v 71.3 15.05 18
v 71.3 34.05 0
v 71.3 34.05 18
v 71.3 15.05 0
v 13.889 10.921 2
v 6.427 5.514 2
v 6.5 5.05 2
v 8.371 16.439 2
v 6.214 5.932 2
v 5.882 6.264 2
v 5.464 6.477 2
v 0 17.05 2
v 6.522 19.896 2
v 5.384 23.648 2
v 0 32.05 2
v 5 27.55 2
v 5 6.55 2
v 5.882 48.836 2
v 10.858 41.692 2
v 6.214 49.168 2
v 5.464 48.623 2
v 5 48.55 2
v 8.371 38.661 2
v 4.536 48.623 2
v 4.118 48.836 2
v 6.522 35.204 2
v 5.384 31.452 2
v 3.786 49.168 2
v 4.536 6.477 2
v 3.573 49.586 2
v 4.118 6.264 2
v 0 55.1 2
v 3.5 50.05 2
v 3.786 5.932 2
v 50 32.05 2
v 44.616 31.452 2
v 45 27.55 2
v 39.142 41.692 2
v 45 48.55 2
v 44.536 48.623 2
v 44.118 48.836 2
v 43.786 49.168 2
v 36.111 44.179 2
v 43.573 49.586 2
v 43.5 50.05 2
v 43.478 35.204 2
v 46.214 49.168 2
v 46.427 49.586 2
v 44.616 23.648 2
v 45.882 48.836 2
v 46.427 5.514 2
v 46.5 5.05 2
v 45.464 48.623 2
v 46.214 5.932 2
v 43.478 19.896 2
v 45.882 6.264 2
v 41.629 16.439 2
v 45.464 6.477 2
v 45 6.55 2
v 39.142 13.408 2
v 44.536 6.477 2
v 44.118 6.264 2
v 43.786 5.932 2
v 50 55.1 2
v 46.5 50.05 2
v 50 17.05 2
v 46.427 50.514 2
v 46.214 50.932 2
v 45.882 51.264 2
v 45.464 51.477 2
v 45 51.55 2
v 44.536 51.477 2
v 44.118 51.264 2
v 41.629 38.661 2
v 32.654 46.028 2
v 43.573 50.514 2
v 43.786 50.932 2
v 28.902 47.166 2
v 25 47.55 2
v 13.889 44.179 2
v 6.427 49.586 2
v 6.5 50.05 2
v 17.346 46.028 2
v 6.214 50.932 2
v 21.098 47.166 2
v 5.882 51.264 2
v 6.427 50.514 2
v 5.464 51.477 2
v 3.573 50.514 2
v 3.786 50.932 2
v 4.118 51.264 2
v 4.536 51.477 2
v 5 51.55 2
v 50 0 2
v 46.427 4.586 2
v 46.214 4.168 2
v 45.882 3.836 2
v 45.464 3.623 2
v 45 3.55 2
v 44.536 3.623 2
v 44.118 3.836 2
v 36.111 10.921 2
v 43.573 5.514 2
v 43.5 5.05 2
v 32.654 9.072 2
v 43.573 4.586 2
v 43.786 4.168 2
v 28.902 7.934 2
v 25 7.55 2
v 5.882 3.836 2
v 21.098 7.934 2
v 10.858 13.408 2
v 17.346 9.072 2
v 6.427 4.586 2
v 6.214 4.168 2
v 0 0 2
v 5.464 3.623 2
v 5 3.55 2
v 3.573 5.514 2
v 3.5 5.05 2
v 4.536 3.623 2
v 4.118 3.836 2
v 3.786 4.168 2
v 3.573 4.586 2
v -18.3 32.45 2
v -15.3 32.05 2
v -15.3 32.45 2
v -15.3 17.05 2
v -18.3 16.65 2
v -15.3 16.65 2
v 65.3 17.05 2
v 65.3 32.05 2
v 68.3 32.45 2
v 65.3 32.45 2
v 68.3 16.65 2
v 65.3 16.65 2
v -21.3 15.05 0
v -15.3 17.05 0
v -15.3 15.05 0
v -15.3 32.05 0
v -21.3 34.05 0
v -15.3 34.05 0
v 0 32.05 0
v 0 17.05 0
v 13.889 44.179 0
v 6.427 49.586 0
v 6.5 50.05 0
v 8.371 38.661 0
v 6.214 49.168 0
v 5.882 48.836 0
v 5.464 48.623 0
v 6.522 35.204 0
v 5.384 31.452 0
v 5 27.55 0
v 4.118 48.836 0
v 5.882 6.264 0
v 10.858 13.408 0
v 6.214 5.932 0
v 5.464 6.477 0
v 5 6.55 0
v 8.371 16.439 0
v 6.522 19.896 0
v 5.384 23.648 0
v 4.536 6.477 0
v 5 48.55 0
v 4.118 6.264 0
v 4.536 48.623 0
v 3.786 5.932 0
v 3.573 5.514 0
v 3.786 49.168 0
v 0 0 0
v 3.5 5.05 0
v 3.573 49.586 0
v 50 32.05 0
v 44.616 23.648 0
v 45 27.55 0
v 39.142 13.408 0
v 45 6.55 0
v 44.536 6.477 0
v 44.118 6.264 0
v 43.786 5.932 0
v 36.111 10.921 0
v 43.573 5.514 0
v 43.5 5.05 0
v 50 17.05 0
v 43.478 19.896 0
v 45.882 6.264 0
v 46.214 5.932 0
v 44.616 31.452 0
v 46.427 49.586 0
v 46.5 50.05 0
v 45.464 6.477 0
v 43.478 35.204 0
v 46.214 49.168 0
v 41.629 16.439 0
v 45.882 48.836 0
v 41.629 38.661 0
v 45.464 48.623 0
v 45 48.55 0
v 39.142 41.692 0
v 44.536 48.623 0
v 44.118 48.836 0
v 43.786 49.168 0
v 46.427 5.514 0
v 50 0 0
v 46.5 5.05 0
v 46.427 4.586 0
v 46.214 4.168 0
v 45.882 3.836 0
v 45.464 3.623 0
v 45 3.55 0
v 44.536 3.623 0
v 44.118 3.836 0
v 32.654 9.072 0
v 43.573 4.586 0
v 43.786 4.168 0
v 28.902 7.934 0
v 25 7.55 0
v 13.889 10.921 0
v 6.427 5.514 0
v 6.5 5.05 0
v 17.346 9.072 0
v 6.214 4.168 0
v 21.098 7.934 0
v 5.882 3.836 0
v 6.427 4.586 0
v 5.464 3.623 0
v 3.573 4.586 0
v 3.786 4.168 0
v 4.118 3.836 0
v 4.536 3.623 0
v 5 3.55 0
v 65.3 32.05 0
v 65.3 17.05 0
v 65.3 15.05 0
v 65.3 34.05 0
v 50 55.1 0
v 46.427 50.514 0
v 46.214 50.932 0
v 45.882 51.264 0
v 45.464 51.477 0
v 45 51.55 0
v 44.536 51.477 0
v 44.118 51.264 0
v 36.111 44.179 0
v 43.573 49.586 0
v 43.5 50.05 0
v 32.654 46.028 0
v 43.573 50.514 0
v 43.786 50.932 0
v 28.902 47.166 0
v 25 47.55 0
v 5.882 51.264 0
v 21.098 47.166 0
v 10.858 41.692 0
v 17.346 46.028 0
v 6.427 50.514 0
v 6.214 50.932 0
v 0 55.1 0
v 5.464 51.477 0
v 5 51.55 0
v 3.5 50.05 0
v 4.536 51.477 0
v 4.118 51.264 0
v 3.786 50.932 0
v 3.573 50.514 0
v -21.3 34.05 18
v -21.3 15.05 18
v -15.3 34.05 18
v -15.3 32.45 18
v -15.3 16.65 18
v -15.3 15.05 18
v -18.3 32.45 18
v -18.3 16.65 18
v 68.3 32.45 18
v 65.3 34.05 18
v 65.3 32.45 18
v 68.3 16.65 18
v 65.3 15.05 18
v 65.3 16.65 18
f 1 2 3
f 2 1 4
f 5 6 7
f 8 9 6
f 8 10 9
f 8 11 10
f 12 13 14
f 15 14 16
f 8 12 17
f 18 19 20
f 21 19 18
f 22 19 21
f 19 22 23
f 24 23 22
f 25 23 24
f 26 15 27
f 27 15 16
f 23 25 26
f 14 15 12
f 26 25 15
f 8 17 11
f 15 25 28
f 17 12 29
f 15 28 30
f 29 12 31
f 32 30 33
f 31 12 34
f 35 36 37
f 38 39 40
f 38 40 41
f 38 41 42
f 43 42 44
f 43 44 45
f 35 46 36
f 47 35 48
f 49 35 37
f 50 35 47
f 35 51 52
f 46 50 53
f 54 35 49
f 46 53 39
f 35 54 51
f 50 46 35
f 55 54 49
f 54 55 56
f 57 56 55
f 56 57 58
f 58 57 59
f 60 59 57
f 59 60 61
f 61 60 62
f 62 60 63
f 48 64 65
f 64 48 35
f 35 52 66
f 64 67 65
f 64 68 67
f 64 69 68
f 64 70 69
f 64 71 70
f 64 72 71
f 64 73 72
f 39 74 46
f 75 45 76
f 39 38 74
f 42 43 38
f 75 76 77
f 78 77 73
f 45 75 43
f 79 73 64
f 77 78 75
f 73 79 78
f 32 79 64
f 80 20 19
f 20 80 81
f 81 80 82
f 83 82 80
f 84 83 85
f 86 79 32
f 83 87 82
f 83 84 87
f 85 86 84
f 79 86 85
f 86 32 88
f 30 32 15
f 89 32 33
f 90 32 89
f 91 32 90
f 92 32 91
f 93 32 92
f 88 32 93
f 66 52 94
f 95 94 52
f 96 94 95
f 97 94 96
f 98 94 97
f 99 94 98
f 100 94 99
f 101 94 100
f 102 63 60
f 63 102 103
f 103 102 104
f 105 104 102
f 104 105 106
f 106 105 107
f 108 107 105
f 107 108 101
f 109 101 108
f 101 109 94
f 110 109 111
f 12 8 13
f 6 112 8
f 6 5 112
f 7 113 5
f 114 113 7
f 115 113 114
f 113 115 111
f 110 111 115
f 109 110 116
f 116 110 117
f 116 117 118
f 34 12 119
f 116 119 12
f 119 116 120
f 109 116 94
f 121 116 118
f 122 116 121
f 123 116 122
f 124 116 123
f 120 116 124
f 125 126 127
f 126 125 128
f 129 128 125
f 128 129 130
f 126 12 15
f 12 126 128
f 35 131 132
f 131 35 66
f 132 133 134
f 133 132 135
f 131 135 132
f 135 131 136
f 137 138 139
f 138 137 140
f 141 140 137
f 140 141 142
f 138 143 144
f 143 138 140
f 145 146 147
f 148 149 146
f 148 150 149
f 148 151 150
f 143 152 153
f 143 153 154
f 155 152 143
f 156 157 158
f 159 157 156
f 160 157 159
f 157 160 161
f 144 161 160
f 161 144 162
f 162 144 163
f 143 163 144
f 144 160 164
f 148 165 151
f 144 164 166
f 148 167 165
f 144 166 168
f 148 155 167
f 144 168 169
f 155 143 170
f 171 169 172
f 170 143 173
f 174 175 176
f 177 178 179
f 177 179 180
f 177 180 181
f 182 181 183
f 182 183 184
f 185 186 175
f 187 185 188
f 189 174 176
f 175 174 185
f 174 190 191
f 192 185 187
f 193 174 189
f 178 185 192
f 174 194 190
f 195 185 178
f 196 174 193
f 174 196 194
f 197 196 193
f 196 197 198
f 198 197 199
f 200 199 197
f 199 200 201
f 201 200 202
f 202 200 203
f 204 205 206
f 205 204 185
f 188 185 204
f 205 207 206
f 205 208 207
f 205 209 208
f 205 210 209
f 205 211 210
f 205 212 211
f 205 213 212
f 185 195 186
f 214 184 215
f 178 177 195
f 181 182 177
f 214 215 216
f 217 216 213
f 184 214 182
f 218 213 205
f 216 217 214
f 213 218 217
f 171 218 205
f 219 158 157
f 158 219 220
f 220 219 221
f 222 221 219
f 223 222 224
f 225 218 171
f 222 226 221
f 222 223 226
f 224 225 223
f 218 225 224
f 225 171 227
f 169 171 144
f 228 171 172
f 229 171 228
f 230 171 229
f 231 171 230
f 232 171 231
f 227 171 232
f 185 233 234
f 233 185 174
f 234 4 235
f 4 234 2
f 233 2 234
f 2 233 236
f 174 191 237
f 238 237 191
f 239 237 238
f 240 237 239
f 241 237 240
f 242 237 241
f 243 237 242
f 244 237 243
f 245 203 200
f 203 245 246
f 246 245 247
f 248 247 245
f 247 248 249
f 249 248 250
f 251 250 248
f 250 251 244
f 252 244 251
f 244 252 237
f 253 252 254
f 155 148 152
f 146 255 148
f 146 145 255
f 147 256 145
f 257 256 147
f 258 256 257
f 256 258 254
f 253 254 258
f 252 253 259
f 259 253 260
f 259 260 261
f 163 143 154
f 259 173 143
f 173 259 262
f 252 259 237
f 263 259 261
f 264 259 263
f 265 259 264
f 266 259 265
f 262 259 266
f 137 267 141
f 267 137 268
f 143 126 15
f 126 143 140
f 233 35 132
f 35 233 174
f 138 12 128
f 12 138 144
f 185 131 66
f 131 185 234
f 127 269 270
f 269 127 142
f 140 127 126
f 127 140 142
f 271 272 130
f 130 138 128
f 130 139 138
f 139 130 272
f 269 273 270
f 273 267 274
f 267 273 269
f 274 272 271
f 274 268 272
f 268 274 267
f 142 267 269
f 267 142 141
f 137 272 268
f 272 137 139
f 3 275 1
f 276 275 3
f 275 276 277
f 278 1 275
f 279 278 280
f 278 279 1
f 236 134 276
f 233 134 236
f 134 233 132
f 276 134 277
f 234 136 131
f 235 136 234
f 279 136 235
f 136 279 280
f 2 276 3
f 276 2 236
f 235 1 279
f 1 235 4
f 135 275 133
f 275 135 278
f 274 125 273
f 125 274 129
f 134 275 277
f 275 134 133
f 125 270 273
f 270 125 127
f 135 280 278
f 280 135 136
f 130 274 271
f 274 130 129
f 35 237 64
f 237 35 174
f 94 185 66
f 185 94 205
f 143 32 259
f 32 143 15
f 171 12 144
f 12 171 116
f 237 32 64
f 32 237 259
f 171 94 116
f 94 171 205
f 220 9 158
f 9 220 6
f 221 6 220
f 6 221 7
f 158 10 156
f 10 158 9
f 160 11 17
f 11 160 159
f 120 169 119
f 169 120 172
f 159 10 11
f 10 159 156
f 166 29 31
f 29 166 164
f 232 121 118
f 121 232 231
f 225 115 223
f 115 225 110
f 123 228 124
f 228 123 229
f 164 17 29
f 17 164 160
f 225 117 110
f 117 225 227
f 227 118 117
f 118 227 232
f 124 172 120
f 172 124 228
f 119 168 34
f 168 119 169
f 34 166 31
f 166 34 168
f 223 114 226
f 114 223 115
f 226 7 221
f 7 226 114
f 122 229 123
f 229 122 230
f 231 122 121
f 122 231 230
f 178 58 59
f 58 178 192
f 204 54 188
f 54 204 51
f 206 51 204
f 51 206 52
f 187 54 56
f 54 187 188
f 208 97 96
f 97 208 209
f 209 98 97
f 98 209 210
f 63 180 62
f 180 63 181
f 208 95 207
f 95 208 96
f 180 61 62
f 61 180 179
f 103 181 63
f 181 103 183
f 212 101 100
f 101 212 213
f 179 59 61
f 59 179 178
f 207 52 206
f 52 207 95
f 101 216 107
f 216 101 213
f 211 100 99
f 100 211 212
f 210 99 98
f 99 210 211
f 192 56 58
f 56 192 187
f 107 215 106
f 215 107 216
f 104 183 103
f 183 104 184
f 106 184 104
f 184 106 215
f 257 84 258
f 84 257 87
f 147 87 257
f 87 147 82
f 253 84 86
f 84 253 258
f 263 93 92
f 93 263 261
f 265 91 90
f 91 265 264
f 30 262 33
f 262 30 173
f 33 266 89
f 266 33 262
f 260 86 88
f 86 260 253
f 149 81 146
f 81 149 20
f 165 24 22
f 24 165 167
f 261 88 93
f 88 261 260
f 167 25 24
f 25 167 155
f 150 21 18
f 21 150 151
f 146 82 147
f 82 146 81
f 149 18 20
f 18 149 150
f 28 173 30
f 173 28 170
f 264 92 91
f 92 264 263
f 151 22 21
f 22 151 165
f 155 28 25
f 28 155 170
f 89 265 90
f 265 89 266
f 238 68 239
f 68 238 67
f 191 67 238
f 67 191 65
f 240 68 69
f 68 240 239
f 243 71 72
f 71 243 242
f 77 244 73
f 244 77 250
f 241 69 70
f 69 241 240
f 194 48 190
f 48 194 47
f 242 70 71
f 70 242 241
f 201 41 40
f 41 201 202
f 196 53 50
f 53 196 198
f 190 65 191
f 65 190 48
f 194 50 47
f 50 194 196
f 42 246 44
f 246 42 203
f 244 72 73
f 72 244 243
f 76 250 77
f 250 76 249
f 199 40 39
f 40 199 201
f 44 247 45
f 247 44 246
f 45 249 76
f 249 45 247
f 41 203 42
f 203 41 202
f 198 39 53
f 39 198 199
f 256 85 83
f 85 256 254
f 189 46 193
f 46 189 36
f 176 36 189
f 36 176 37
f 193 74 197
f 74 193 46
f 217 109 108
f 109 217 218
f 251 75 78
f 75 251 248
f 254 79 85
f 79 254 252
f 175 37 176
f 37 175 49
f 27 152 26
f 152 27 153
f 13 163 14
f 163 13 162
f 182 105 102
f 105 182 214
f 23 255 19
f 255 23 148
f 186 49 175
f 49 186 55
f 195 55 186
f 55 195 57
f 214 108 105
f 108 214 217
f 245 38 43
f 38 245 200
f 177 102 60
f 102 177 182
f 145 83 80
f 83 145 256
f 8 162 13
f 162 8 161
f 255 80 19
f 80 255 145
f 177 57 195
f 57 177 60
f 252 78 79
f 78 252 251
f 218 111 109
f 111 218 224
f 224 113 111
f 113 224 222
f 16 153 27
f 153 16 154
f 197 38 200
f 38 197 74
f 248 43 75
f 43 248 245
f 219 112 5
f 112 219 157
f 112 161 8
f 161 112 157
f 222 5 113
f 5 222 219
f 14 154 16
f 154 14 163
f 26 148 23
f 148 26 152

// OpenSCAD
// autotron Pi mountovi

// opće konstante
r_hole=3.5/2;

// power bank

// dimenzije
pb_w=79.2;
pb_l=110.14;
pb_h=21.25;
pb_d=3;
pb_sup=5;
pb_holder_l=15;
pb_holder_h_back=5;
pb_save_r=30;
// mount rupe
pb_mount_l=65.75;
pb_mount_w_front=47.02;
pb_mount_w_back=53.85;
pb_mount_l_displace=18;

// kontrola motora

// dimenzije
moto_a=50;
moto_b=55.1;
moto_hole_a=40;
moto_hole_b=45;
pind=3;
pinh=3;
flatw=55;
flath=2;
grab_l=3;
grab_h=16;

// RPi

// dimenzije
rpi_l=56.06;
rpi_w=85.05;
rpi_d=2.5;
rpi_r_l=20;
rpi_f_l1=5;
rpi_f_s2=16.3;
rpi_f_l2=5;
rpi_f_s3=41;
rpi_f_l3=7;
rpi_f_l4=25;
// mount
rpi_hole_l=43.2;
rpi_hole_w=44.5;
rpi_holder_h=8;

//cam

//dimenzije
cam_l=1.75;
cam_w=25;
cam_h=23.85;
cam_r=7.5/2;
cam_s_r=2.5/2;
//mount
cam_holder_h=10;
cam_holder_grab=2;
cam_holder_d=2;
cam_hole_w=14;

//[x,y,z]

//color([255,0,0,100])powerbank();
//translate([-pb_d,-pb_d,-pb_d])pb();
powershield();
//RPi();
//translate([-10,0,0])cam_base();
//cam_hold();

module cam_hold(){
    difference(){
        union(){
            cube([cam_h,cam_w+2*cam_holder_d,flath],false);
            cube([cam_h+flath*4+r_hole*2,cam_holder_d,flath+cam_holder_h/2],false);
            translate([0,cam_w+cam_holder_d,0])cube([cam_h+flath*4+r_hole*2,cam_holder_d,flath+cam_holder_h/2],false);
        }
        translate([cam_h+flath*4,0,flath+r_hole])rotate([90,0,0])cylinder(200,r_hole,r_hole,true,$fn=32);
        translate([cam_h/2-2,cam_w/2+cam_holder_d,0])cylinder(20,cam_r,cam_r,true,$fn=32);
        translate([cam_h/2-2,cam_w+cam_holder_d-flath,0])cylinder(20,cam_s_r,cam_s_r,true,$fn=32);
        translate([cam_h/2-2,cam_holder_d+flath,0])cylinder(20,cam_s_r,cam_s_r,true,$fn=32);
    }
}

module cam_base(){
    difference(){
    union(){
        cube([cam_l+2*cam_holder_d,cam_w+2*cam_holder_d,flath],false);
        difference(){
            translate([0,cam_holder_d+cam_w/2,0])cylinder(flath,cam_holder_d+cam_w/2,cam_holder_d+cam_w/2,false,$fn=32);
            translate([0.01,0,-1])cube([50,cam_w+2*cam_holder_d,flath+2],false);
            translate([-3,cam_w/2+cam_holder_d-cam_hole_w/2,-1])cylinder(flath+2,r_hole,r_hole,false,$fn=32);
            translate([-3,cam_w/2+cam_holder_d+cam_hole_w/2,-1])cylinder(flath+2,r_hole,r_hole,false,$fn=32);
        }
        translate([0,cam_holder_d,0])cube([2*cam_holder_d+cam_l,cam_holder_d,cam_holder_h+flath-0.01],false);
        translate([0,cam_w,0])cube([2*cam_holder_d+cam_l,cam_holder_d,cam_holder_h+flath-0.01],false);
        translate([0,cam_holder_d,0]) cube([2*cam_holder_d+cam_l,cam_w,flath+3]);
    }
    translate([cam_l/2+cam_holder_d,0,cam_holder_h*4/5])rotate([90,0,0])cylinder(200,r_hole,r_hole,true,$fn=32);
    }
}

module RPi(){
    union(){
        difference(){
            cube([rpi_l+2*rpi_d,rpi_w+2*rpi_d,rpi_d],false);
            translate([rpi_l/2+rpi_d-rpi_hole_l/2,rpi_w/2+rpi_d,-1])cylinder(rpi_d+2,r_hole,r_hole,false,$fn=32);
            translate([rpi_l/2+rpi_d+rpi_hole_l/2,rpi_w/2+rpi_d+rpi_hole_w/2,-1])cylinder(rpi_d+2,r_hole,r_hole,false,$fn=32);
            translate([rpi_l/2+rpi_d+rpi_hole_l/2,rpi_w/2+rpi_d-rpi_hole_w/2,-1])cylinder(rpi_d+2,r_hole,r_hole,false,$fn=32);
            translate([rpi_l/2+rpi_d,rpi_w/2+rpi_d,-1])cube([30,60,10],true);
        }
        translate([0,0,rpi_d-0.5])cube([rpi_d,rpi_w+2*rpi_d,rpi_holder_h],false);
        translate([0,0,rpi_d-0.5])cube([rpi_r_l,rpi_d,rpi_holder_h],false);
        translate([2*rpi_d+rpi_l-rpi_r_l,0,rpi_d-0.5])cube([rpi_r_l,rpi_d,rpi_holder_h],false);
        translate([rpi_d+rpi_l,rpi_d,rpi_d-0.5])cube([rpi_d,rpi_f_l1,rpi_holder_h],false);
        translate([rpi_d+rpi_l,rpi_d+rpi_f_s2,rpi_d-0.5])cube([rpi_d,rpi_f_l2,rpi_holder_h],false);
        translate([rpi_d+rpi_l,rpi_d+rpi_f_s3,rpi_d-0.5])cube([rpi_d,rpi_f_l3,rpi_holder_h],false);
        translate([rpi_d+rpi_l,2*rpi_d+rpi_w-rpi_f_l4,rpi_d-0.5])cube([rpi_d,rpi_f_l4,rpi_holder_h],false);
    }
}

module powershield(){
    corr=0.7; //dimension correction
    union(){
        difference(){
            union(){
                cube([moto_a,moto_b,flath],false);
                translate([moto_a/2-2*pb_d-pb_w/2-corr,moto_b/2-pb_holder_l/2-grab_l,0]){
                    difference(){
                        union(){
                            cube([4*pb_d+pb_w+2*corr,pb_holder_l,flath],false);
                            translate([0,-flath,0]) 
                                cube([2*pb_d,pb_holder_l+2*flath,grab_h+flath],false);
                            translate([pb_w+2*pb_d+2*corr,-flath,0]) 
                                cube([2*pb_d,pb_holder_l+2*flath,grab_h+flath],false);
                        }
                        translate([pb_d,-0.4,flath])
                            cube([2*pb_d+pb_w+2*corr,pb_holder_l+0.8,grab_h+flath]);
                    }
                }
            }
            translate([moto_a/2,moto_b/2,flath/2])cylinder(flath+2,20,20,true,$fn=32);
            pinovi(4,pind/2,[moto_a/2-moto_hole_a/2,moto_b/2-moto_hole_b/2,-1],pinh);
        }
    }
}

module powerbank(){
    cube([pb_l,pb_w,pb_h],false);
}

module pb(){
    union(){
        // glavna ploca
        difference(){
            cube([pb_l+2*pb_d,pb_w+2*pb_d,pb_d],false);
            translate([pb_d+pb_l/2,pb_d+pb_w/2,-1])cylinder(pb_d+2,pb_save_r,pb_save_r,false);
            // mount rupe
            translate([pb_l+pb_d-pb_mount_l_displace,pb_d+pb_w/2,0]){
                translate([-pb_mount_l,pb_mount_w_back/2,-1])cylinder(pb_d+2,r_hole,r_hole,false);
                translate([-pb_mount_l,-pb_mount_w_back/2,-1])cylinder(pb_d+2,r_hole,r_hole,false);
                translate([0,pb_mount_w_front/2,-1])cylinder(pb_d+2,r_hole,r_hole,false);
                translate([0,-pb_mount_w_front/2,-1])cylinder(pb_d+2,r_hole,r_hole,false);
            }
        }
        // drzaci
        pb_drzac();
        translate([pb_l/2+pb_d-pb_holder_l/2,0,0])pb_drzac();
        translate([pb_l+2*pb_d-pb_holder_l,0,0])pb_drzac();
        translate([pb_l+2*pb_d,pb_w+pb_d*2,0])rotate([0,0,180]){
            pb_drzac();
            translate([pb_l/2+pb_d-pb_holder_l/2,0,0])pb_drzac();
            translate([pb_l+2*pb_d-pb_holder_l,0,0])pb_drzac();
        }
        translate([0,pb_w/2+pb_d-pb_holder_l/2,0])cube([pb_d,pb_holder_l,pb_d+pb_holder_h_back],false);
        translate([pb_l+pb_d,pb_w/2+pb_d-pb_holder_l/2,0])cube([pb_d,pb_holder_l,pb_d+pb_h/2],false);
    }
}

module pb_drzac(){
        cube([pb_holder_l,pb_d,pb_h+2*pb_d],false);
        difference(){
            cube([pb_holder_l,pb_sup+pb_d,pb_sup+pb_d],false);
            translate([-1,pb_sup+pb_d,pb_sup+pb_d])rotate([0,90,0])cylinder(pb_holder_l+2,pb_sup,pb_sup,false,$fn=30);
        }
}

module pinovi(lift,pinr,off,pinh){
    
    startpinr=2.5*pinr;
    endpinr=2*pinr;
    pin1=[0,0,0];
    pin2=[moto_hole_a,0,0];
    pin3=[0,moto_hole_b,0];
    pin4=[moto_hole_a,moto_hole_b,0];
    
    translate(off){
        translate(pin1){
            union(){
                //cylinder(lift,startpinr,endpinr,false,$fn=20);
                cylinder(lift+pinh,pinr,pinr,false,$fn=20);
            }
        }
        translate(pin2){
            union(){
                //cylinder(lift,startpinr,endpinr,false,$fn=20);
                cylinder(lift+pinh,pinr,pinr,false,$fn=20);
            }
        }
        translate(pin3){
            union(){
                //cylinder(lift,startpinr,endpinr,false,$fn=20);
                cylinder(lift+pinh,pinr,pinr,false,$fn=20);
            }
        }
        translate(pin4){
            union(){
                //cylinder(lift,startpinr,endpinr,false,$fn=20);
                cylinder(lift+pinh,pinr,pinr,false,$fn=20);
            }
        }
    }
}
